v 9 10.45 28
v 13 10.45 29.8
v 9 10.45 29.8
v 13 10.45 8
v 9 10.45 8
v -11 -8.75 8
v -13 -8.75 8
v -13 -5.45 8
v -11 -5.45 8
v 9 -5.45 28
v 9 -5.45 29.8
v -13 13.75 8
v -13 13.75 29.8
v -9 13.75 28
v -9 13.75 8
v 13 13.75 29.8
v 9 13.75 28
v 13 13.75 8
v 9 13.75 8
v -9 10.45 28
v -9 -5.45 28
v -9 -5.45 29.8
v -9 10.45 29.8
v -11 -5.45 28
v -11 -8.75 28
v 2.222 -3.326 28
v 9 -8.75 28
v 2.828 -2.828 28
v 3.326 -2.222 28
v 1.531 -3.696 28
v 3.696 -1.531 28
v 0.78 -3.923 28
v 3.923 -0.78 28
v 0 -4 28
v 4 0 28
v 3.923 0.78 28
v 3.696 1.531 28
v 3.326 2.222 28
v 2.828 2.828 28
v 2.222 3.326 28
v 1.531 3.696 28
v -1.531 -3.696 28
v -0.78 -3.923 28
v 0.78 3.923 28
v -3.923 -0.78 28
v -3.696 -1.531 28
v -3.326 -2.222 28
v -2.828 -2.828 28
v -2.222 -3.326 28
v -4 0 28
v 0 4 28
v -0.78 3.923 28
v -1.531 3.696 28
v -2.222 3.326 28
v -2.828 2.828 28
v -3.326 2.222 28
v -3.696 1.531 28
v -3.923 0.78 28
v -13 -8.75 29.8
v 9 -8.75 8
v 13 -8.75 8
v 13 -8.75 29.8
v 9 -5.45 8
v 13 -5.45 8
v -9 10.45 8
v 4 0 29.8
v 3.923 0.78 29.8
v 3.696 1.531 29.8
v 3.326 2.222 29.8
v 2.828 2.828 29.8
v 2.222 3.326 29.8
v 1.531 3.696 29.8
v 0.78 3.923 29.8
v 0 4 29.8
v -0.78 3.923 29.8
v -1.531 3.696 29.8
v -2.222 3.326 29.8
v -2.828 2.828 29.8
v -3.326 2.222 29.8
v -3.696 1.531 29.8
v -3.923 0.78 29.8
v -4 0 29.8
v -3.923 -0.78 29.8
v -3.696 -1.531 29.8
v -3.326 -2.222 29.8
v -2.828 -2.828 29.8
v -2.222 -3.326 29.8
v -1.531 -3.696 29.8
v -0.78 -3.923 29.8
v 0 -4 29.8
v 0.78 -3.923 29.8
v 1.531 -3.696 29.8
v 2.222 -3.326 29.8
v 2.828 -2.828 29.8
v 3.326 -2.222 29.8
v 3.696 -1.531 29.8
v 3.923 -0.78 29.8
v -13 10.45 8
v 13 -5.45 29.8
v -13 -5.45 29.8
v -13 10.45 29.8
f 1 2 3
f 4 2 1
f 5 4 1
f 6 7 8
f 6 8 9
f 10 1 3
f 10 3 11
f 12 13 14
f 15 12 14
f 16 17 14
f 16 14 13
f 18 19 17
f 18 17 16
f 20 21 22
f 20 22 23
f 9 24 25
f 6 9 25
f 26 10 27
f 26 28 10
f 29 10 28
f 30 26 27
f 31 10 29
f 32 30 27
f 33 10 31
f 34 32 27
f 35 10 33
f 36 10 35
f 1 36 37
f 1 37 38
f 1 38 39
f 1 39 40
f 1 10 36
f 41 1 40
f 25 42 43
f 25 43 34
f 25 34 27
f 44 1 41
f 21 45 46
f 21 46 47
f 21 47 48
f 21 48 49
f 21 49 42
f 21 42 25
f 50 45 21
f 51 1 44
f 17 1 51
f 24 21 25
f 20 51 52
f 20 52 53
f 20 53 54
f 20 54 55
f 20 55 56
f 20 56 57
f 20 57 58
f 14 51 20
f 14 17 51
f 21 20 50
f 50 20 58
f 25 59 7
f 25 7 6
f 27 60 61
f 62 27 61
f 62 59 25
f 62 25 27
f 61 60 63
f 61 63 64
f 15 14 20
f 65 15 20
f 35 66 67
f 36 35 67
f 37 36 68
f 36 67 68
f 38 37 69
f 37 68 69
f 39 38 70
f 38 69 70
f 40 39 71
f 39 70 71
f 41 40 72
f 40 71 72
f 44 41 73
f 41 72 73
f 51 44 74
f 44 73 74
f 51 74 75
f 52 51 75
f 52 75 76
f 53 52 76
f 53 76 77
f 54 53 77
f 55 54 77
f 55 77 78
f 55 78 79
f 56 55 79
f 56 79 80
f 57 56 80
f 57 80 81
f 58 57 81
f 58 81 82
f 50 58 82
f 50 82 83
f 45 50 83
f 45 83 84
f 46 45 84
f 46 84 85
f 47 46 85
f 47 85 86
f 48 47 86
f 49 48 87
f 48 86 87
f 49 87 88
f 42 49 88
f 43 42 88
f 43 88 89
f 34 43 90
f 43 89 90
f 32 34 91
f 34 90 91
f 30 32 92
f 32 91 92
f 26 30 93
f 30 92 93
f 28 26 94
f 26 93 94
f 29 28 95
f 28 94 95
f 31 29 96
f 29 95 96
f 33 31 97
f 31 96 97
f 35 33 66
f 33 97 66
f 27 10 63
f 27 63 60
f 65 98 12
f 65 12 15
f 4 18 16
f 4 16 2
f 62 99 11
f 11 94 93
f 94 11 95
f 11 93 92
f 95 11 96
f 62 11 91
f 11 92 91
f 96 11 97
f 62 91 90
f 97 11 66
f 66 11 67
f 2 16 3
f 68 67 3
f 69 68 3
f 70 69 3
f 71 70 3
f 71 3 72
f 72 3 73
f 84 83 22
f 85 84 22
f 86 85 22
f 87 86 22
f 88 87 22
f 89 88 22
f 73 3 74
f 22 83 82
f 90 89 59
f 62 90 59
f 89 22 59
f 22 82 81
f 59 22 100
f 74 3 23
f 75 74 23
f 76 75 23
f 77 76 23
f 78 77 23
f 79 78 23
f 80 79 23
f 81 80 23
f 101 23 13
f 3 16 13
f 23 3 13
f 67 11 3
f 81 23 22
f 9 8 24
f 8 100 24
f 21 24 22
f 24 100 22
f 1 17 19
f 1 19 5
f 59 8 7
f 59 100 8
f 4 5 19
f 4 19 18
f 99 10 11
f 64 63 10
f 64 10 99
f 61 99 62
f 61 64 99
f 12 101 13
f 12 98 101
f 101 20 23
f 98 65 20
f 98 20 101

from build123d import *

# Parameters (mm, degrees)
PAD009_DEPTH    = 1.8
SKETCH033_R     = 4
POCKET021_DEPTH = 5
SKETCH_W        = 2
SKETCH_H        = 3.3
SKETCH_W_2      = 4
PAD_DEPTH       = 20


with BuildPart() as part:
    # Sketch031 → Pad009 (new body)
    with BuildSketch(Plane.XY):
        Polygon((-13, 13.75), (13, 13.75), (13, 10.45), (9, 10.45), (9, -5.45), (13, -5.45), (13, -8.75), (-13, -8.75), (-13, -5.45), (-9, -5.45), (-9, 10.45), (-13, 10.45), align=None)
    extrude(amount=PAD009_DEPTH)

    # Sketch033 → Pocket021 (cut)
    with BuildSketch(Plane.XY.offset(2)):
        Circle(SKETCH033_R)
    extrude(amount=-POCKET021_DEPTH, mode=Mode.SUBTRACT)

    # Sketch (on Face13 of Pad009) → Pad (join)
    with BuildSketch(Plane(origin=(0, 0, 0), x_dir=(1, 0, 0), z_dir=(0, 0, -1))):
        with Locations((-12, 7.1)):
            Rectangle(SKETCH_W, SKETCH_H)
        with Locations((11, 7.1)):
            Rectangle(SKETCH_W_2, SKETCH_H)
        with Locations((11, -12.1)):
            Rectangle(SKETCH_W_2, SKETCH_H)
        with Locations((-11, -12.1)):
            Rectangle(SKETCH_W_2, SKETCH_H)
    extrude(amount=PAD_DEPTH)


with BuildPart() as part_1:
    # Body005 placement: moved
    add(part.part.moved(Location((0, 0, 28))))


solid = part_1.part
